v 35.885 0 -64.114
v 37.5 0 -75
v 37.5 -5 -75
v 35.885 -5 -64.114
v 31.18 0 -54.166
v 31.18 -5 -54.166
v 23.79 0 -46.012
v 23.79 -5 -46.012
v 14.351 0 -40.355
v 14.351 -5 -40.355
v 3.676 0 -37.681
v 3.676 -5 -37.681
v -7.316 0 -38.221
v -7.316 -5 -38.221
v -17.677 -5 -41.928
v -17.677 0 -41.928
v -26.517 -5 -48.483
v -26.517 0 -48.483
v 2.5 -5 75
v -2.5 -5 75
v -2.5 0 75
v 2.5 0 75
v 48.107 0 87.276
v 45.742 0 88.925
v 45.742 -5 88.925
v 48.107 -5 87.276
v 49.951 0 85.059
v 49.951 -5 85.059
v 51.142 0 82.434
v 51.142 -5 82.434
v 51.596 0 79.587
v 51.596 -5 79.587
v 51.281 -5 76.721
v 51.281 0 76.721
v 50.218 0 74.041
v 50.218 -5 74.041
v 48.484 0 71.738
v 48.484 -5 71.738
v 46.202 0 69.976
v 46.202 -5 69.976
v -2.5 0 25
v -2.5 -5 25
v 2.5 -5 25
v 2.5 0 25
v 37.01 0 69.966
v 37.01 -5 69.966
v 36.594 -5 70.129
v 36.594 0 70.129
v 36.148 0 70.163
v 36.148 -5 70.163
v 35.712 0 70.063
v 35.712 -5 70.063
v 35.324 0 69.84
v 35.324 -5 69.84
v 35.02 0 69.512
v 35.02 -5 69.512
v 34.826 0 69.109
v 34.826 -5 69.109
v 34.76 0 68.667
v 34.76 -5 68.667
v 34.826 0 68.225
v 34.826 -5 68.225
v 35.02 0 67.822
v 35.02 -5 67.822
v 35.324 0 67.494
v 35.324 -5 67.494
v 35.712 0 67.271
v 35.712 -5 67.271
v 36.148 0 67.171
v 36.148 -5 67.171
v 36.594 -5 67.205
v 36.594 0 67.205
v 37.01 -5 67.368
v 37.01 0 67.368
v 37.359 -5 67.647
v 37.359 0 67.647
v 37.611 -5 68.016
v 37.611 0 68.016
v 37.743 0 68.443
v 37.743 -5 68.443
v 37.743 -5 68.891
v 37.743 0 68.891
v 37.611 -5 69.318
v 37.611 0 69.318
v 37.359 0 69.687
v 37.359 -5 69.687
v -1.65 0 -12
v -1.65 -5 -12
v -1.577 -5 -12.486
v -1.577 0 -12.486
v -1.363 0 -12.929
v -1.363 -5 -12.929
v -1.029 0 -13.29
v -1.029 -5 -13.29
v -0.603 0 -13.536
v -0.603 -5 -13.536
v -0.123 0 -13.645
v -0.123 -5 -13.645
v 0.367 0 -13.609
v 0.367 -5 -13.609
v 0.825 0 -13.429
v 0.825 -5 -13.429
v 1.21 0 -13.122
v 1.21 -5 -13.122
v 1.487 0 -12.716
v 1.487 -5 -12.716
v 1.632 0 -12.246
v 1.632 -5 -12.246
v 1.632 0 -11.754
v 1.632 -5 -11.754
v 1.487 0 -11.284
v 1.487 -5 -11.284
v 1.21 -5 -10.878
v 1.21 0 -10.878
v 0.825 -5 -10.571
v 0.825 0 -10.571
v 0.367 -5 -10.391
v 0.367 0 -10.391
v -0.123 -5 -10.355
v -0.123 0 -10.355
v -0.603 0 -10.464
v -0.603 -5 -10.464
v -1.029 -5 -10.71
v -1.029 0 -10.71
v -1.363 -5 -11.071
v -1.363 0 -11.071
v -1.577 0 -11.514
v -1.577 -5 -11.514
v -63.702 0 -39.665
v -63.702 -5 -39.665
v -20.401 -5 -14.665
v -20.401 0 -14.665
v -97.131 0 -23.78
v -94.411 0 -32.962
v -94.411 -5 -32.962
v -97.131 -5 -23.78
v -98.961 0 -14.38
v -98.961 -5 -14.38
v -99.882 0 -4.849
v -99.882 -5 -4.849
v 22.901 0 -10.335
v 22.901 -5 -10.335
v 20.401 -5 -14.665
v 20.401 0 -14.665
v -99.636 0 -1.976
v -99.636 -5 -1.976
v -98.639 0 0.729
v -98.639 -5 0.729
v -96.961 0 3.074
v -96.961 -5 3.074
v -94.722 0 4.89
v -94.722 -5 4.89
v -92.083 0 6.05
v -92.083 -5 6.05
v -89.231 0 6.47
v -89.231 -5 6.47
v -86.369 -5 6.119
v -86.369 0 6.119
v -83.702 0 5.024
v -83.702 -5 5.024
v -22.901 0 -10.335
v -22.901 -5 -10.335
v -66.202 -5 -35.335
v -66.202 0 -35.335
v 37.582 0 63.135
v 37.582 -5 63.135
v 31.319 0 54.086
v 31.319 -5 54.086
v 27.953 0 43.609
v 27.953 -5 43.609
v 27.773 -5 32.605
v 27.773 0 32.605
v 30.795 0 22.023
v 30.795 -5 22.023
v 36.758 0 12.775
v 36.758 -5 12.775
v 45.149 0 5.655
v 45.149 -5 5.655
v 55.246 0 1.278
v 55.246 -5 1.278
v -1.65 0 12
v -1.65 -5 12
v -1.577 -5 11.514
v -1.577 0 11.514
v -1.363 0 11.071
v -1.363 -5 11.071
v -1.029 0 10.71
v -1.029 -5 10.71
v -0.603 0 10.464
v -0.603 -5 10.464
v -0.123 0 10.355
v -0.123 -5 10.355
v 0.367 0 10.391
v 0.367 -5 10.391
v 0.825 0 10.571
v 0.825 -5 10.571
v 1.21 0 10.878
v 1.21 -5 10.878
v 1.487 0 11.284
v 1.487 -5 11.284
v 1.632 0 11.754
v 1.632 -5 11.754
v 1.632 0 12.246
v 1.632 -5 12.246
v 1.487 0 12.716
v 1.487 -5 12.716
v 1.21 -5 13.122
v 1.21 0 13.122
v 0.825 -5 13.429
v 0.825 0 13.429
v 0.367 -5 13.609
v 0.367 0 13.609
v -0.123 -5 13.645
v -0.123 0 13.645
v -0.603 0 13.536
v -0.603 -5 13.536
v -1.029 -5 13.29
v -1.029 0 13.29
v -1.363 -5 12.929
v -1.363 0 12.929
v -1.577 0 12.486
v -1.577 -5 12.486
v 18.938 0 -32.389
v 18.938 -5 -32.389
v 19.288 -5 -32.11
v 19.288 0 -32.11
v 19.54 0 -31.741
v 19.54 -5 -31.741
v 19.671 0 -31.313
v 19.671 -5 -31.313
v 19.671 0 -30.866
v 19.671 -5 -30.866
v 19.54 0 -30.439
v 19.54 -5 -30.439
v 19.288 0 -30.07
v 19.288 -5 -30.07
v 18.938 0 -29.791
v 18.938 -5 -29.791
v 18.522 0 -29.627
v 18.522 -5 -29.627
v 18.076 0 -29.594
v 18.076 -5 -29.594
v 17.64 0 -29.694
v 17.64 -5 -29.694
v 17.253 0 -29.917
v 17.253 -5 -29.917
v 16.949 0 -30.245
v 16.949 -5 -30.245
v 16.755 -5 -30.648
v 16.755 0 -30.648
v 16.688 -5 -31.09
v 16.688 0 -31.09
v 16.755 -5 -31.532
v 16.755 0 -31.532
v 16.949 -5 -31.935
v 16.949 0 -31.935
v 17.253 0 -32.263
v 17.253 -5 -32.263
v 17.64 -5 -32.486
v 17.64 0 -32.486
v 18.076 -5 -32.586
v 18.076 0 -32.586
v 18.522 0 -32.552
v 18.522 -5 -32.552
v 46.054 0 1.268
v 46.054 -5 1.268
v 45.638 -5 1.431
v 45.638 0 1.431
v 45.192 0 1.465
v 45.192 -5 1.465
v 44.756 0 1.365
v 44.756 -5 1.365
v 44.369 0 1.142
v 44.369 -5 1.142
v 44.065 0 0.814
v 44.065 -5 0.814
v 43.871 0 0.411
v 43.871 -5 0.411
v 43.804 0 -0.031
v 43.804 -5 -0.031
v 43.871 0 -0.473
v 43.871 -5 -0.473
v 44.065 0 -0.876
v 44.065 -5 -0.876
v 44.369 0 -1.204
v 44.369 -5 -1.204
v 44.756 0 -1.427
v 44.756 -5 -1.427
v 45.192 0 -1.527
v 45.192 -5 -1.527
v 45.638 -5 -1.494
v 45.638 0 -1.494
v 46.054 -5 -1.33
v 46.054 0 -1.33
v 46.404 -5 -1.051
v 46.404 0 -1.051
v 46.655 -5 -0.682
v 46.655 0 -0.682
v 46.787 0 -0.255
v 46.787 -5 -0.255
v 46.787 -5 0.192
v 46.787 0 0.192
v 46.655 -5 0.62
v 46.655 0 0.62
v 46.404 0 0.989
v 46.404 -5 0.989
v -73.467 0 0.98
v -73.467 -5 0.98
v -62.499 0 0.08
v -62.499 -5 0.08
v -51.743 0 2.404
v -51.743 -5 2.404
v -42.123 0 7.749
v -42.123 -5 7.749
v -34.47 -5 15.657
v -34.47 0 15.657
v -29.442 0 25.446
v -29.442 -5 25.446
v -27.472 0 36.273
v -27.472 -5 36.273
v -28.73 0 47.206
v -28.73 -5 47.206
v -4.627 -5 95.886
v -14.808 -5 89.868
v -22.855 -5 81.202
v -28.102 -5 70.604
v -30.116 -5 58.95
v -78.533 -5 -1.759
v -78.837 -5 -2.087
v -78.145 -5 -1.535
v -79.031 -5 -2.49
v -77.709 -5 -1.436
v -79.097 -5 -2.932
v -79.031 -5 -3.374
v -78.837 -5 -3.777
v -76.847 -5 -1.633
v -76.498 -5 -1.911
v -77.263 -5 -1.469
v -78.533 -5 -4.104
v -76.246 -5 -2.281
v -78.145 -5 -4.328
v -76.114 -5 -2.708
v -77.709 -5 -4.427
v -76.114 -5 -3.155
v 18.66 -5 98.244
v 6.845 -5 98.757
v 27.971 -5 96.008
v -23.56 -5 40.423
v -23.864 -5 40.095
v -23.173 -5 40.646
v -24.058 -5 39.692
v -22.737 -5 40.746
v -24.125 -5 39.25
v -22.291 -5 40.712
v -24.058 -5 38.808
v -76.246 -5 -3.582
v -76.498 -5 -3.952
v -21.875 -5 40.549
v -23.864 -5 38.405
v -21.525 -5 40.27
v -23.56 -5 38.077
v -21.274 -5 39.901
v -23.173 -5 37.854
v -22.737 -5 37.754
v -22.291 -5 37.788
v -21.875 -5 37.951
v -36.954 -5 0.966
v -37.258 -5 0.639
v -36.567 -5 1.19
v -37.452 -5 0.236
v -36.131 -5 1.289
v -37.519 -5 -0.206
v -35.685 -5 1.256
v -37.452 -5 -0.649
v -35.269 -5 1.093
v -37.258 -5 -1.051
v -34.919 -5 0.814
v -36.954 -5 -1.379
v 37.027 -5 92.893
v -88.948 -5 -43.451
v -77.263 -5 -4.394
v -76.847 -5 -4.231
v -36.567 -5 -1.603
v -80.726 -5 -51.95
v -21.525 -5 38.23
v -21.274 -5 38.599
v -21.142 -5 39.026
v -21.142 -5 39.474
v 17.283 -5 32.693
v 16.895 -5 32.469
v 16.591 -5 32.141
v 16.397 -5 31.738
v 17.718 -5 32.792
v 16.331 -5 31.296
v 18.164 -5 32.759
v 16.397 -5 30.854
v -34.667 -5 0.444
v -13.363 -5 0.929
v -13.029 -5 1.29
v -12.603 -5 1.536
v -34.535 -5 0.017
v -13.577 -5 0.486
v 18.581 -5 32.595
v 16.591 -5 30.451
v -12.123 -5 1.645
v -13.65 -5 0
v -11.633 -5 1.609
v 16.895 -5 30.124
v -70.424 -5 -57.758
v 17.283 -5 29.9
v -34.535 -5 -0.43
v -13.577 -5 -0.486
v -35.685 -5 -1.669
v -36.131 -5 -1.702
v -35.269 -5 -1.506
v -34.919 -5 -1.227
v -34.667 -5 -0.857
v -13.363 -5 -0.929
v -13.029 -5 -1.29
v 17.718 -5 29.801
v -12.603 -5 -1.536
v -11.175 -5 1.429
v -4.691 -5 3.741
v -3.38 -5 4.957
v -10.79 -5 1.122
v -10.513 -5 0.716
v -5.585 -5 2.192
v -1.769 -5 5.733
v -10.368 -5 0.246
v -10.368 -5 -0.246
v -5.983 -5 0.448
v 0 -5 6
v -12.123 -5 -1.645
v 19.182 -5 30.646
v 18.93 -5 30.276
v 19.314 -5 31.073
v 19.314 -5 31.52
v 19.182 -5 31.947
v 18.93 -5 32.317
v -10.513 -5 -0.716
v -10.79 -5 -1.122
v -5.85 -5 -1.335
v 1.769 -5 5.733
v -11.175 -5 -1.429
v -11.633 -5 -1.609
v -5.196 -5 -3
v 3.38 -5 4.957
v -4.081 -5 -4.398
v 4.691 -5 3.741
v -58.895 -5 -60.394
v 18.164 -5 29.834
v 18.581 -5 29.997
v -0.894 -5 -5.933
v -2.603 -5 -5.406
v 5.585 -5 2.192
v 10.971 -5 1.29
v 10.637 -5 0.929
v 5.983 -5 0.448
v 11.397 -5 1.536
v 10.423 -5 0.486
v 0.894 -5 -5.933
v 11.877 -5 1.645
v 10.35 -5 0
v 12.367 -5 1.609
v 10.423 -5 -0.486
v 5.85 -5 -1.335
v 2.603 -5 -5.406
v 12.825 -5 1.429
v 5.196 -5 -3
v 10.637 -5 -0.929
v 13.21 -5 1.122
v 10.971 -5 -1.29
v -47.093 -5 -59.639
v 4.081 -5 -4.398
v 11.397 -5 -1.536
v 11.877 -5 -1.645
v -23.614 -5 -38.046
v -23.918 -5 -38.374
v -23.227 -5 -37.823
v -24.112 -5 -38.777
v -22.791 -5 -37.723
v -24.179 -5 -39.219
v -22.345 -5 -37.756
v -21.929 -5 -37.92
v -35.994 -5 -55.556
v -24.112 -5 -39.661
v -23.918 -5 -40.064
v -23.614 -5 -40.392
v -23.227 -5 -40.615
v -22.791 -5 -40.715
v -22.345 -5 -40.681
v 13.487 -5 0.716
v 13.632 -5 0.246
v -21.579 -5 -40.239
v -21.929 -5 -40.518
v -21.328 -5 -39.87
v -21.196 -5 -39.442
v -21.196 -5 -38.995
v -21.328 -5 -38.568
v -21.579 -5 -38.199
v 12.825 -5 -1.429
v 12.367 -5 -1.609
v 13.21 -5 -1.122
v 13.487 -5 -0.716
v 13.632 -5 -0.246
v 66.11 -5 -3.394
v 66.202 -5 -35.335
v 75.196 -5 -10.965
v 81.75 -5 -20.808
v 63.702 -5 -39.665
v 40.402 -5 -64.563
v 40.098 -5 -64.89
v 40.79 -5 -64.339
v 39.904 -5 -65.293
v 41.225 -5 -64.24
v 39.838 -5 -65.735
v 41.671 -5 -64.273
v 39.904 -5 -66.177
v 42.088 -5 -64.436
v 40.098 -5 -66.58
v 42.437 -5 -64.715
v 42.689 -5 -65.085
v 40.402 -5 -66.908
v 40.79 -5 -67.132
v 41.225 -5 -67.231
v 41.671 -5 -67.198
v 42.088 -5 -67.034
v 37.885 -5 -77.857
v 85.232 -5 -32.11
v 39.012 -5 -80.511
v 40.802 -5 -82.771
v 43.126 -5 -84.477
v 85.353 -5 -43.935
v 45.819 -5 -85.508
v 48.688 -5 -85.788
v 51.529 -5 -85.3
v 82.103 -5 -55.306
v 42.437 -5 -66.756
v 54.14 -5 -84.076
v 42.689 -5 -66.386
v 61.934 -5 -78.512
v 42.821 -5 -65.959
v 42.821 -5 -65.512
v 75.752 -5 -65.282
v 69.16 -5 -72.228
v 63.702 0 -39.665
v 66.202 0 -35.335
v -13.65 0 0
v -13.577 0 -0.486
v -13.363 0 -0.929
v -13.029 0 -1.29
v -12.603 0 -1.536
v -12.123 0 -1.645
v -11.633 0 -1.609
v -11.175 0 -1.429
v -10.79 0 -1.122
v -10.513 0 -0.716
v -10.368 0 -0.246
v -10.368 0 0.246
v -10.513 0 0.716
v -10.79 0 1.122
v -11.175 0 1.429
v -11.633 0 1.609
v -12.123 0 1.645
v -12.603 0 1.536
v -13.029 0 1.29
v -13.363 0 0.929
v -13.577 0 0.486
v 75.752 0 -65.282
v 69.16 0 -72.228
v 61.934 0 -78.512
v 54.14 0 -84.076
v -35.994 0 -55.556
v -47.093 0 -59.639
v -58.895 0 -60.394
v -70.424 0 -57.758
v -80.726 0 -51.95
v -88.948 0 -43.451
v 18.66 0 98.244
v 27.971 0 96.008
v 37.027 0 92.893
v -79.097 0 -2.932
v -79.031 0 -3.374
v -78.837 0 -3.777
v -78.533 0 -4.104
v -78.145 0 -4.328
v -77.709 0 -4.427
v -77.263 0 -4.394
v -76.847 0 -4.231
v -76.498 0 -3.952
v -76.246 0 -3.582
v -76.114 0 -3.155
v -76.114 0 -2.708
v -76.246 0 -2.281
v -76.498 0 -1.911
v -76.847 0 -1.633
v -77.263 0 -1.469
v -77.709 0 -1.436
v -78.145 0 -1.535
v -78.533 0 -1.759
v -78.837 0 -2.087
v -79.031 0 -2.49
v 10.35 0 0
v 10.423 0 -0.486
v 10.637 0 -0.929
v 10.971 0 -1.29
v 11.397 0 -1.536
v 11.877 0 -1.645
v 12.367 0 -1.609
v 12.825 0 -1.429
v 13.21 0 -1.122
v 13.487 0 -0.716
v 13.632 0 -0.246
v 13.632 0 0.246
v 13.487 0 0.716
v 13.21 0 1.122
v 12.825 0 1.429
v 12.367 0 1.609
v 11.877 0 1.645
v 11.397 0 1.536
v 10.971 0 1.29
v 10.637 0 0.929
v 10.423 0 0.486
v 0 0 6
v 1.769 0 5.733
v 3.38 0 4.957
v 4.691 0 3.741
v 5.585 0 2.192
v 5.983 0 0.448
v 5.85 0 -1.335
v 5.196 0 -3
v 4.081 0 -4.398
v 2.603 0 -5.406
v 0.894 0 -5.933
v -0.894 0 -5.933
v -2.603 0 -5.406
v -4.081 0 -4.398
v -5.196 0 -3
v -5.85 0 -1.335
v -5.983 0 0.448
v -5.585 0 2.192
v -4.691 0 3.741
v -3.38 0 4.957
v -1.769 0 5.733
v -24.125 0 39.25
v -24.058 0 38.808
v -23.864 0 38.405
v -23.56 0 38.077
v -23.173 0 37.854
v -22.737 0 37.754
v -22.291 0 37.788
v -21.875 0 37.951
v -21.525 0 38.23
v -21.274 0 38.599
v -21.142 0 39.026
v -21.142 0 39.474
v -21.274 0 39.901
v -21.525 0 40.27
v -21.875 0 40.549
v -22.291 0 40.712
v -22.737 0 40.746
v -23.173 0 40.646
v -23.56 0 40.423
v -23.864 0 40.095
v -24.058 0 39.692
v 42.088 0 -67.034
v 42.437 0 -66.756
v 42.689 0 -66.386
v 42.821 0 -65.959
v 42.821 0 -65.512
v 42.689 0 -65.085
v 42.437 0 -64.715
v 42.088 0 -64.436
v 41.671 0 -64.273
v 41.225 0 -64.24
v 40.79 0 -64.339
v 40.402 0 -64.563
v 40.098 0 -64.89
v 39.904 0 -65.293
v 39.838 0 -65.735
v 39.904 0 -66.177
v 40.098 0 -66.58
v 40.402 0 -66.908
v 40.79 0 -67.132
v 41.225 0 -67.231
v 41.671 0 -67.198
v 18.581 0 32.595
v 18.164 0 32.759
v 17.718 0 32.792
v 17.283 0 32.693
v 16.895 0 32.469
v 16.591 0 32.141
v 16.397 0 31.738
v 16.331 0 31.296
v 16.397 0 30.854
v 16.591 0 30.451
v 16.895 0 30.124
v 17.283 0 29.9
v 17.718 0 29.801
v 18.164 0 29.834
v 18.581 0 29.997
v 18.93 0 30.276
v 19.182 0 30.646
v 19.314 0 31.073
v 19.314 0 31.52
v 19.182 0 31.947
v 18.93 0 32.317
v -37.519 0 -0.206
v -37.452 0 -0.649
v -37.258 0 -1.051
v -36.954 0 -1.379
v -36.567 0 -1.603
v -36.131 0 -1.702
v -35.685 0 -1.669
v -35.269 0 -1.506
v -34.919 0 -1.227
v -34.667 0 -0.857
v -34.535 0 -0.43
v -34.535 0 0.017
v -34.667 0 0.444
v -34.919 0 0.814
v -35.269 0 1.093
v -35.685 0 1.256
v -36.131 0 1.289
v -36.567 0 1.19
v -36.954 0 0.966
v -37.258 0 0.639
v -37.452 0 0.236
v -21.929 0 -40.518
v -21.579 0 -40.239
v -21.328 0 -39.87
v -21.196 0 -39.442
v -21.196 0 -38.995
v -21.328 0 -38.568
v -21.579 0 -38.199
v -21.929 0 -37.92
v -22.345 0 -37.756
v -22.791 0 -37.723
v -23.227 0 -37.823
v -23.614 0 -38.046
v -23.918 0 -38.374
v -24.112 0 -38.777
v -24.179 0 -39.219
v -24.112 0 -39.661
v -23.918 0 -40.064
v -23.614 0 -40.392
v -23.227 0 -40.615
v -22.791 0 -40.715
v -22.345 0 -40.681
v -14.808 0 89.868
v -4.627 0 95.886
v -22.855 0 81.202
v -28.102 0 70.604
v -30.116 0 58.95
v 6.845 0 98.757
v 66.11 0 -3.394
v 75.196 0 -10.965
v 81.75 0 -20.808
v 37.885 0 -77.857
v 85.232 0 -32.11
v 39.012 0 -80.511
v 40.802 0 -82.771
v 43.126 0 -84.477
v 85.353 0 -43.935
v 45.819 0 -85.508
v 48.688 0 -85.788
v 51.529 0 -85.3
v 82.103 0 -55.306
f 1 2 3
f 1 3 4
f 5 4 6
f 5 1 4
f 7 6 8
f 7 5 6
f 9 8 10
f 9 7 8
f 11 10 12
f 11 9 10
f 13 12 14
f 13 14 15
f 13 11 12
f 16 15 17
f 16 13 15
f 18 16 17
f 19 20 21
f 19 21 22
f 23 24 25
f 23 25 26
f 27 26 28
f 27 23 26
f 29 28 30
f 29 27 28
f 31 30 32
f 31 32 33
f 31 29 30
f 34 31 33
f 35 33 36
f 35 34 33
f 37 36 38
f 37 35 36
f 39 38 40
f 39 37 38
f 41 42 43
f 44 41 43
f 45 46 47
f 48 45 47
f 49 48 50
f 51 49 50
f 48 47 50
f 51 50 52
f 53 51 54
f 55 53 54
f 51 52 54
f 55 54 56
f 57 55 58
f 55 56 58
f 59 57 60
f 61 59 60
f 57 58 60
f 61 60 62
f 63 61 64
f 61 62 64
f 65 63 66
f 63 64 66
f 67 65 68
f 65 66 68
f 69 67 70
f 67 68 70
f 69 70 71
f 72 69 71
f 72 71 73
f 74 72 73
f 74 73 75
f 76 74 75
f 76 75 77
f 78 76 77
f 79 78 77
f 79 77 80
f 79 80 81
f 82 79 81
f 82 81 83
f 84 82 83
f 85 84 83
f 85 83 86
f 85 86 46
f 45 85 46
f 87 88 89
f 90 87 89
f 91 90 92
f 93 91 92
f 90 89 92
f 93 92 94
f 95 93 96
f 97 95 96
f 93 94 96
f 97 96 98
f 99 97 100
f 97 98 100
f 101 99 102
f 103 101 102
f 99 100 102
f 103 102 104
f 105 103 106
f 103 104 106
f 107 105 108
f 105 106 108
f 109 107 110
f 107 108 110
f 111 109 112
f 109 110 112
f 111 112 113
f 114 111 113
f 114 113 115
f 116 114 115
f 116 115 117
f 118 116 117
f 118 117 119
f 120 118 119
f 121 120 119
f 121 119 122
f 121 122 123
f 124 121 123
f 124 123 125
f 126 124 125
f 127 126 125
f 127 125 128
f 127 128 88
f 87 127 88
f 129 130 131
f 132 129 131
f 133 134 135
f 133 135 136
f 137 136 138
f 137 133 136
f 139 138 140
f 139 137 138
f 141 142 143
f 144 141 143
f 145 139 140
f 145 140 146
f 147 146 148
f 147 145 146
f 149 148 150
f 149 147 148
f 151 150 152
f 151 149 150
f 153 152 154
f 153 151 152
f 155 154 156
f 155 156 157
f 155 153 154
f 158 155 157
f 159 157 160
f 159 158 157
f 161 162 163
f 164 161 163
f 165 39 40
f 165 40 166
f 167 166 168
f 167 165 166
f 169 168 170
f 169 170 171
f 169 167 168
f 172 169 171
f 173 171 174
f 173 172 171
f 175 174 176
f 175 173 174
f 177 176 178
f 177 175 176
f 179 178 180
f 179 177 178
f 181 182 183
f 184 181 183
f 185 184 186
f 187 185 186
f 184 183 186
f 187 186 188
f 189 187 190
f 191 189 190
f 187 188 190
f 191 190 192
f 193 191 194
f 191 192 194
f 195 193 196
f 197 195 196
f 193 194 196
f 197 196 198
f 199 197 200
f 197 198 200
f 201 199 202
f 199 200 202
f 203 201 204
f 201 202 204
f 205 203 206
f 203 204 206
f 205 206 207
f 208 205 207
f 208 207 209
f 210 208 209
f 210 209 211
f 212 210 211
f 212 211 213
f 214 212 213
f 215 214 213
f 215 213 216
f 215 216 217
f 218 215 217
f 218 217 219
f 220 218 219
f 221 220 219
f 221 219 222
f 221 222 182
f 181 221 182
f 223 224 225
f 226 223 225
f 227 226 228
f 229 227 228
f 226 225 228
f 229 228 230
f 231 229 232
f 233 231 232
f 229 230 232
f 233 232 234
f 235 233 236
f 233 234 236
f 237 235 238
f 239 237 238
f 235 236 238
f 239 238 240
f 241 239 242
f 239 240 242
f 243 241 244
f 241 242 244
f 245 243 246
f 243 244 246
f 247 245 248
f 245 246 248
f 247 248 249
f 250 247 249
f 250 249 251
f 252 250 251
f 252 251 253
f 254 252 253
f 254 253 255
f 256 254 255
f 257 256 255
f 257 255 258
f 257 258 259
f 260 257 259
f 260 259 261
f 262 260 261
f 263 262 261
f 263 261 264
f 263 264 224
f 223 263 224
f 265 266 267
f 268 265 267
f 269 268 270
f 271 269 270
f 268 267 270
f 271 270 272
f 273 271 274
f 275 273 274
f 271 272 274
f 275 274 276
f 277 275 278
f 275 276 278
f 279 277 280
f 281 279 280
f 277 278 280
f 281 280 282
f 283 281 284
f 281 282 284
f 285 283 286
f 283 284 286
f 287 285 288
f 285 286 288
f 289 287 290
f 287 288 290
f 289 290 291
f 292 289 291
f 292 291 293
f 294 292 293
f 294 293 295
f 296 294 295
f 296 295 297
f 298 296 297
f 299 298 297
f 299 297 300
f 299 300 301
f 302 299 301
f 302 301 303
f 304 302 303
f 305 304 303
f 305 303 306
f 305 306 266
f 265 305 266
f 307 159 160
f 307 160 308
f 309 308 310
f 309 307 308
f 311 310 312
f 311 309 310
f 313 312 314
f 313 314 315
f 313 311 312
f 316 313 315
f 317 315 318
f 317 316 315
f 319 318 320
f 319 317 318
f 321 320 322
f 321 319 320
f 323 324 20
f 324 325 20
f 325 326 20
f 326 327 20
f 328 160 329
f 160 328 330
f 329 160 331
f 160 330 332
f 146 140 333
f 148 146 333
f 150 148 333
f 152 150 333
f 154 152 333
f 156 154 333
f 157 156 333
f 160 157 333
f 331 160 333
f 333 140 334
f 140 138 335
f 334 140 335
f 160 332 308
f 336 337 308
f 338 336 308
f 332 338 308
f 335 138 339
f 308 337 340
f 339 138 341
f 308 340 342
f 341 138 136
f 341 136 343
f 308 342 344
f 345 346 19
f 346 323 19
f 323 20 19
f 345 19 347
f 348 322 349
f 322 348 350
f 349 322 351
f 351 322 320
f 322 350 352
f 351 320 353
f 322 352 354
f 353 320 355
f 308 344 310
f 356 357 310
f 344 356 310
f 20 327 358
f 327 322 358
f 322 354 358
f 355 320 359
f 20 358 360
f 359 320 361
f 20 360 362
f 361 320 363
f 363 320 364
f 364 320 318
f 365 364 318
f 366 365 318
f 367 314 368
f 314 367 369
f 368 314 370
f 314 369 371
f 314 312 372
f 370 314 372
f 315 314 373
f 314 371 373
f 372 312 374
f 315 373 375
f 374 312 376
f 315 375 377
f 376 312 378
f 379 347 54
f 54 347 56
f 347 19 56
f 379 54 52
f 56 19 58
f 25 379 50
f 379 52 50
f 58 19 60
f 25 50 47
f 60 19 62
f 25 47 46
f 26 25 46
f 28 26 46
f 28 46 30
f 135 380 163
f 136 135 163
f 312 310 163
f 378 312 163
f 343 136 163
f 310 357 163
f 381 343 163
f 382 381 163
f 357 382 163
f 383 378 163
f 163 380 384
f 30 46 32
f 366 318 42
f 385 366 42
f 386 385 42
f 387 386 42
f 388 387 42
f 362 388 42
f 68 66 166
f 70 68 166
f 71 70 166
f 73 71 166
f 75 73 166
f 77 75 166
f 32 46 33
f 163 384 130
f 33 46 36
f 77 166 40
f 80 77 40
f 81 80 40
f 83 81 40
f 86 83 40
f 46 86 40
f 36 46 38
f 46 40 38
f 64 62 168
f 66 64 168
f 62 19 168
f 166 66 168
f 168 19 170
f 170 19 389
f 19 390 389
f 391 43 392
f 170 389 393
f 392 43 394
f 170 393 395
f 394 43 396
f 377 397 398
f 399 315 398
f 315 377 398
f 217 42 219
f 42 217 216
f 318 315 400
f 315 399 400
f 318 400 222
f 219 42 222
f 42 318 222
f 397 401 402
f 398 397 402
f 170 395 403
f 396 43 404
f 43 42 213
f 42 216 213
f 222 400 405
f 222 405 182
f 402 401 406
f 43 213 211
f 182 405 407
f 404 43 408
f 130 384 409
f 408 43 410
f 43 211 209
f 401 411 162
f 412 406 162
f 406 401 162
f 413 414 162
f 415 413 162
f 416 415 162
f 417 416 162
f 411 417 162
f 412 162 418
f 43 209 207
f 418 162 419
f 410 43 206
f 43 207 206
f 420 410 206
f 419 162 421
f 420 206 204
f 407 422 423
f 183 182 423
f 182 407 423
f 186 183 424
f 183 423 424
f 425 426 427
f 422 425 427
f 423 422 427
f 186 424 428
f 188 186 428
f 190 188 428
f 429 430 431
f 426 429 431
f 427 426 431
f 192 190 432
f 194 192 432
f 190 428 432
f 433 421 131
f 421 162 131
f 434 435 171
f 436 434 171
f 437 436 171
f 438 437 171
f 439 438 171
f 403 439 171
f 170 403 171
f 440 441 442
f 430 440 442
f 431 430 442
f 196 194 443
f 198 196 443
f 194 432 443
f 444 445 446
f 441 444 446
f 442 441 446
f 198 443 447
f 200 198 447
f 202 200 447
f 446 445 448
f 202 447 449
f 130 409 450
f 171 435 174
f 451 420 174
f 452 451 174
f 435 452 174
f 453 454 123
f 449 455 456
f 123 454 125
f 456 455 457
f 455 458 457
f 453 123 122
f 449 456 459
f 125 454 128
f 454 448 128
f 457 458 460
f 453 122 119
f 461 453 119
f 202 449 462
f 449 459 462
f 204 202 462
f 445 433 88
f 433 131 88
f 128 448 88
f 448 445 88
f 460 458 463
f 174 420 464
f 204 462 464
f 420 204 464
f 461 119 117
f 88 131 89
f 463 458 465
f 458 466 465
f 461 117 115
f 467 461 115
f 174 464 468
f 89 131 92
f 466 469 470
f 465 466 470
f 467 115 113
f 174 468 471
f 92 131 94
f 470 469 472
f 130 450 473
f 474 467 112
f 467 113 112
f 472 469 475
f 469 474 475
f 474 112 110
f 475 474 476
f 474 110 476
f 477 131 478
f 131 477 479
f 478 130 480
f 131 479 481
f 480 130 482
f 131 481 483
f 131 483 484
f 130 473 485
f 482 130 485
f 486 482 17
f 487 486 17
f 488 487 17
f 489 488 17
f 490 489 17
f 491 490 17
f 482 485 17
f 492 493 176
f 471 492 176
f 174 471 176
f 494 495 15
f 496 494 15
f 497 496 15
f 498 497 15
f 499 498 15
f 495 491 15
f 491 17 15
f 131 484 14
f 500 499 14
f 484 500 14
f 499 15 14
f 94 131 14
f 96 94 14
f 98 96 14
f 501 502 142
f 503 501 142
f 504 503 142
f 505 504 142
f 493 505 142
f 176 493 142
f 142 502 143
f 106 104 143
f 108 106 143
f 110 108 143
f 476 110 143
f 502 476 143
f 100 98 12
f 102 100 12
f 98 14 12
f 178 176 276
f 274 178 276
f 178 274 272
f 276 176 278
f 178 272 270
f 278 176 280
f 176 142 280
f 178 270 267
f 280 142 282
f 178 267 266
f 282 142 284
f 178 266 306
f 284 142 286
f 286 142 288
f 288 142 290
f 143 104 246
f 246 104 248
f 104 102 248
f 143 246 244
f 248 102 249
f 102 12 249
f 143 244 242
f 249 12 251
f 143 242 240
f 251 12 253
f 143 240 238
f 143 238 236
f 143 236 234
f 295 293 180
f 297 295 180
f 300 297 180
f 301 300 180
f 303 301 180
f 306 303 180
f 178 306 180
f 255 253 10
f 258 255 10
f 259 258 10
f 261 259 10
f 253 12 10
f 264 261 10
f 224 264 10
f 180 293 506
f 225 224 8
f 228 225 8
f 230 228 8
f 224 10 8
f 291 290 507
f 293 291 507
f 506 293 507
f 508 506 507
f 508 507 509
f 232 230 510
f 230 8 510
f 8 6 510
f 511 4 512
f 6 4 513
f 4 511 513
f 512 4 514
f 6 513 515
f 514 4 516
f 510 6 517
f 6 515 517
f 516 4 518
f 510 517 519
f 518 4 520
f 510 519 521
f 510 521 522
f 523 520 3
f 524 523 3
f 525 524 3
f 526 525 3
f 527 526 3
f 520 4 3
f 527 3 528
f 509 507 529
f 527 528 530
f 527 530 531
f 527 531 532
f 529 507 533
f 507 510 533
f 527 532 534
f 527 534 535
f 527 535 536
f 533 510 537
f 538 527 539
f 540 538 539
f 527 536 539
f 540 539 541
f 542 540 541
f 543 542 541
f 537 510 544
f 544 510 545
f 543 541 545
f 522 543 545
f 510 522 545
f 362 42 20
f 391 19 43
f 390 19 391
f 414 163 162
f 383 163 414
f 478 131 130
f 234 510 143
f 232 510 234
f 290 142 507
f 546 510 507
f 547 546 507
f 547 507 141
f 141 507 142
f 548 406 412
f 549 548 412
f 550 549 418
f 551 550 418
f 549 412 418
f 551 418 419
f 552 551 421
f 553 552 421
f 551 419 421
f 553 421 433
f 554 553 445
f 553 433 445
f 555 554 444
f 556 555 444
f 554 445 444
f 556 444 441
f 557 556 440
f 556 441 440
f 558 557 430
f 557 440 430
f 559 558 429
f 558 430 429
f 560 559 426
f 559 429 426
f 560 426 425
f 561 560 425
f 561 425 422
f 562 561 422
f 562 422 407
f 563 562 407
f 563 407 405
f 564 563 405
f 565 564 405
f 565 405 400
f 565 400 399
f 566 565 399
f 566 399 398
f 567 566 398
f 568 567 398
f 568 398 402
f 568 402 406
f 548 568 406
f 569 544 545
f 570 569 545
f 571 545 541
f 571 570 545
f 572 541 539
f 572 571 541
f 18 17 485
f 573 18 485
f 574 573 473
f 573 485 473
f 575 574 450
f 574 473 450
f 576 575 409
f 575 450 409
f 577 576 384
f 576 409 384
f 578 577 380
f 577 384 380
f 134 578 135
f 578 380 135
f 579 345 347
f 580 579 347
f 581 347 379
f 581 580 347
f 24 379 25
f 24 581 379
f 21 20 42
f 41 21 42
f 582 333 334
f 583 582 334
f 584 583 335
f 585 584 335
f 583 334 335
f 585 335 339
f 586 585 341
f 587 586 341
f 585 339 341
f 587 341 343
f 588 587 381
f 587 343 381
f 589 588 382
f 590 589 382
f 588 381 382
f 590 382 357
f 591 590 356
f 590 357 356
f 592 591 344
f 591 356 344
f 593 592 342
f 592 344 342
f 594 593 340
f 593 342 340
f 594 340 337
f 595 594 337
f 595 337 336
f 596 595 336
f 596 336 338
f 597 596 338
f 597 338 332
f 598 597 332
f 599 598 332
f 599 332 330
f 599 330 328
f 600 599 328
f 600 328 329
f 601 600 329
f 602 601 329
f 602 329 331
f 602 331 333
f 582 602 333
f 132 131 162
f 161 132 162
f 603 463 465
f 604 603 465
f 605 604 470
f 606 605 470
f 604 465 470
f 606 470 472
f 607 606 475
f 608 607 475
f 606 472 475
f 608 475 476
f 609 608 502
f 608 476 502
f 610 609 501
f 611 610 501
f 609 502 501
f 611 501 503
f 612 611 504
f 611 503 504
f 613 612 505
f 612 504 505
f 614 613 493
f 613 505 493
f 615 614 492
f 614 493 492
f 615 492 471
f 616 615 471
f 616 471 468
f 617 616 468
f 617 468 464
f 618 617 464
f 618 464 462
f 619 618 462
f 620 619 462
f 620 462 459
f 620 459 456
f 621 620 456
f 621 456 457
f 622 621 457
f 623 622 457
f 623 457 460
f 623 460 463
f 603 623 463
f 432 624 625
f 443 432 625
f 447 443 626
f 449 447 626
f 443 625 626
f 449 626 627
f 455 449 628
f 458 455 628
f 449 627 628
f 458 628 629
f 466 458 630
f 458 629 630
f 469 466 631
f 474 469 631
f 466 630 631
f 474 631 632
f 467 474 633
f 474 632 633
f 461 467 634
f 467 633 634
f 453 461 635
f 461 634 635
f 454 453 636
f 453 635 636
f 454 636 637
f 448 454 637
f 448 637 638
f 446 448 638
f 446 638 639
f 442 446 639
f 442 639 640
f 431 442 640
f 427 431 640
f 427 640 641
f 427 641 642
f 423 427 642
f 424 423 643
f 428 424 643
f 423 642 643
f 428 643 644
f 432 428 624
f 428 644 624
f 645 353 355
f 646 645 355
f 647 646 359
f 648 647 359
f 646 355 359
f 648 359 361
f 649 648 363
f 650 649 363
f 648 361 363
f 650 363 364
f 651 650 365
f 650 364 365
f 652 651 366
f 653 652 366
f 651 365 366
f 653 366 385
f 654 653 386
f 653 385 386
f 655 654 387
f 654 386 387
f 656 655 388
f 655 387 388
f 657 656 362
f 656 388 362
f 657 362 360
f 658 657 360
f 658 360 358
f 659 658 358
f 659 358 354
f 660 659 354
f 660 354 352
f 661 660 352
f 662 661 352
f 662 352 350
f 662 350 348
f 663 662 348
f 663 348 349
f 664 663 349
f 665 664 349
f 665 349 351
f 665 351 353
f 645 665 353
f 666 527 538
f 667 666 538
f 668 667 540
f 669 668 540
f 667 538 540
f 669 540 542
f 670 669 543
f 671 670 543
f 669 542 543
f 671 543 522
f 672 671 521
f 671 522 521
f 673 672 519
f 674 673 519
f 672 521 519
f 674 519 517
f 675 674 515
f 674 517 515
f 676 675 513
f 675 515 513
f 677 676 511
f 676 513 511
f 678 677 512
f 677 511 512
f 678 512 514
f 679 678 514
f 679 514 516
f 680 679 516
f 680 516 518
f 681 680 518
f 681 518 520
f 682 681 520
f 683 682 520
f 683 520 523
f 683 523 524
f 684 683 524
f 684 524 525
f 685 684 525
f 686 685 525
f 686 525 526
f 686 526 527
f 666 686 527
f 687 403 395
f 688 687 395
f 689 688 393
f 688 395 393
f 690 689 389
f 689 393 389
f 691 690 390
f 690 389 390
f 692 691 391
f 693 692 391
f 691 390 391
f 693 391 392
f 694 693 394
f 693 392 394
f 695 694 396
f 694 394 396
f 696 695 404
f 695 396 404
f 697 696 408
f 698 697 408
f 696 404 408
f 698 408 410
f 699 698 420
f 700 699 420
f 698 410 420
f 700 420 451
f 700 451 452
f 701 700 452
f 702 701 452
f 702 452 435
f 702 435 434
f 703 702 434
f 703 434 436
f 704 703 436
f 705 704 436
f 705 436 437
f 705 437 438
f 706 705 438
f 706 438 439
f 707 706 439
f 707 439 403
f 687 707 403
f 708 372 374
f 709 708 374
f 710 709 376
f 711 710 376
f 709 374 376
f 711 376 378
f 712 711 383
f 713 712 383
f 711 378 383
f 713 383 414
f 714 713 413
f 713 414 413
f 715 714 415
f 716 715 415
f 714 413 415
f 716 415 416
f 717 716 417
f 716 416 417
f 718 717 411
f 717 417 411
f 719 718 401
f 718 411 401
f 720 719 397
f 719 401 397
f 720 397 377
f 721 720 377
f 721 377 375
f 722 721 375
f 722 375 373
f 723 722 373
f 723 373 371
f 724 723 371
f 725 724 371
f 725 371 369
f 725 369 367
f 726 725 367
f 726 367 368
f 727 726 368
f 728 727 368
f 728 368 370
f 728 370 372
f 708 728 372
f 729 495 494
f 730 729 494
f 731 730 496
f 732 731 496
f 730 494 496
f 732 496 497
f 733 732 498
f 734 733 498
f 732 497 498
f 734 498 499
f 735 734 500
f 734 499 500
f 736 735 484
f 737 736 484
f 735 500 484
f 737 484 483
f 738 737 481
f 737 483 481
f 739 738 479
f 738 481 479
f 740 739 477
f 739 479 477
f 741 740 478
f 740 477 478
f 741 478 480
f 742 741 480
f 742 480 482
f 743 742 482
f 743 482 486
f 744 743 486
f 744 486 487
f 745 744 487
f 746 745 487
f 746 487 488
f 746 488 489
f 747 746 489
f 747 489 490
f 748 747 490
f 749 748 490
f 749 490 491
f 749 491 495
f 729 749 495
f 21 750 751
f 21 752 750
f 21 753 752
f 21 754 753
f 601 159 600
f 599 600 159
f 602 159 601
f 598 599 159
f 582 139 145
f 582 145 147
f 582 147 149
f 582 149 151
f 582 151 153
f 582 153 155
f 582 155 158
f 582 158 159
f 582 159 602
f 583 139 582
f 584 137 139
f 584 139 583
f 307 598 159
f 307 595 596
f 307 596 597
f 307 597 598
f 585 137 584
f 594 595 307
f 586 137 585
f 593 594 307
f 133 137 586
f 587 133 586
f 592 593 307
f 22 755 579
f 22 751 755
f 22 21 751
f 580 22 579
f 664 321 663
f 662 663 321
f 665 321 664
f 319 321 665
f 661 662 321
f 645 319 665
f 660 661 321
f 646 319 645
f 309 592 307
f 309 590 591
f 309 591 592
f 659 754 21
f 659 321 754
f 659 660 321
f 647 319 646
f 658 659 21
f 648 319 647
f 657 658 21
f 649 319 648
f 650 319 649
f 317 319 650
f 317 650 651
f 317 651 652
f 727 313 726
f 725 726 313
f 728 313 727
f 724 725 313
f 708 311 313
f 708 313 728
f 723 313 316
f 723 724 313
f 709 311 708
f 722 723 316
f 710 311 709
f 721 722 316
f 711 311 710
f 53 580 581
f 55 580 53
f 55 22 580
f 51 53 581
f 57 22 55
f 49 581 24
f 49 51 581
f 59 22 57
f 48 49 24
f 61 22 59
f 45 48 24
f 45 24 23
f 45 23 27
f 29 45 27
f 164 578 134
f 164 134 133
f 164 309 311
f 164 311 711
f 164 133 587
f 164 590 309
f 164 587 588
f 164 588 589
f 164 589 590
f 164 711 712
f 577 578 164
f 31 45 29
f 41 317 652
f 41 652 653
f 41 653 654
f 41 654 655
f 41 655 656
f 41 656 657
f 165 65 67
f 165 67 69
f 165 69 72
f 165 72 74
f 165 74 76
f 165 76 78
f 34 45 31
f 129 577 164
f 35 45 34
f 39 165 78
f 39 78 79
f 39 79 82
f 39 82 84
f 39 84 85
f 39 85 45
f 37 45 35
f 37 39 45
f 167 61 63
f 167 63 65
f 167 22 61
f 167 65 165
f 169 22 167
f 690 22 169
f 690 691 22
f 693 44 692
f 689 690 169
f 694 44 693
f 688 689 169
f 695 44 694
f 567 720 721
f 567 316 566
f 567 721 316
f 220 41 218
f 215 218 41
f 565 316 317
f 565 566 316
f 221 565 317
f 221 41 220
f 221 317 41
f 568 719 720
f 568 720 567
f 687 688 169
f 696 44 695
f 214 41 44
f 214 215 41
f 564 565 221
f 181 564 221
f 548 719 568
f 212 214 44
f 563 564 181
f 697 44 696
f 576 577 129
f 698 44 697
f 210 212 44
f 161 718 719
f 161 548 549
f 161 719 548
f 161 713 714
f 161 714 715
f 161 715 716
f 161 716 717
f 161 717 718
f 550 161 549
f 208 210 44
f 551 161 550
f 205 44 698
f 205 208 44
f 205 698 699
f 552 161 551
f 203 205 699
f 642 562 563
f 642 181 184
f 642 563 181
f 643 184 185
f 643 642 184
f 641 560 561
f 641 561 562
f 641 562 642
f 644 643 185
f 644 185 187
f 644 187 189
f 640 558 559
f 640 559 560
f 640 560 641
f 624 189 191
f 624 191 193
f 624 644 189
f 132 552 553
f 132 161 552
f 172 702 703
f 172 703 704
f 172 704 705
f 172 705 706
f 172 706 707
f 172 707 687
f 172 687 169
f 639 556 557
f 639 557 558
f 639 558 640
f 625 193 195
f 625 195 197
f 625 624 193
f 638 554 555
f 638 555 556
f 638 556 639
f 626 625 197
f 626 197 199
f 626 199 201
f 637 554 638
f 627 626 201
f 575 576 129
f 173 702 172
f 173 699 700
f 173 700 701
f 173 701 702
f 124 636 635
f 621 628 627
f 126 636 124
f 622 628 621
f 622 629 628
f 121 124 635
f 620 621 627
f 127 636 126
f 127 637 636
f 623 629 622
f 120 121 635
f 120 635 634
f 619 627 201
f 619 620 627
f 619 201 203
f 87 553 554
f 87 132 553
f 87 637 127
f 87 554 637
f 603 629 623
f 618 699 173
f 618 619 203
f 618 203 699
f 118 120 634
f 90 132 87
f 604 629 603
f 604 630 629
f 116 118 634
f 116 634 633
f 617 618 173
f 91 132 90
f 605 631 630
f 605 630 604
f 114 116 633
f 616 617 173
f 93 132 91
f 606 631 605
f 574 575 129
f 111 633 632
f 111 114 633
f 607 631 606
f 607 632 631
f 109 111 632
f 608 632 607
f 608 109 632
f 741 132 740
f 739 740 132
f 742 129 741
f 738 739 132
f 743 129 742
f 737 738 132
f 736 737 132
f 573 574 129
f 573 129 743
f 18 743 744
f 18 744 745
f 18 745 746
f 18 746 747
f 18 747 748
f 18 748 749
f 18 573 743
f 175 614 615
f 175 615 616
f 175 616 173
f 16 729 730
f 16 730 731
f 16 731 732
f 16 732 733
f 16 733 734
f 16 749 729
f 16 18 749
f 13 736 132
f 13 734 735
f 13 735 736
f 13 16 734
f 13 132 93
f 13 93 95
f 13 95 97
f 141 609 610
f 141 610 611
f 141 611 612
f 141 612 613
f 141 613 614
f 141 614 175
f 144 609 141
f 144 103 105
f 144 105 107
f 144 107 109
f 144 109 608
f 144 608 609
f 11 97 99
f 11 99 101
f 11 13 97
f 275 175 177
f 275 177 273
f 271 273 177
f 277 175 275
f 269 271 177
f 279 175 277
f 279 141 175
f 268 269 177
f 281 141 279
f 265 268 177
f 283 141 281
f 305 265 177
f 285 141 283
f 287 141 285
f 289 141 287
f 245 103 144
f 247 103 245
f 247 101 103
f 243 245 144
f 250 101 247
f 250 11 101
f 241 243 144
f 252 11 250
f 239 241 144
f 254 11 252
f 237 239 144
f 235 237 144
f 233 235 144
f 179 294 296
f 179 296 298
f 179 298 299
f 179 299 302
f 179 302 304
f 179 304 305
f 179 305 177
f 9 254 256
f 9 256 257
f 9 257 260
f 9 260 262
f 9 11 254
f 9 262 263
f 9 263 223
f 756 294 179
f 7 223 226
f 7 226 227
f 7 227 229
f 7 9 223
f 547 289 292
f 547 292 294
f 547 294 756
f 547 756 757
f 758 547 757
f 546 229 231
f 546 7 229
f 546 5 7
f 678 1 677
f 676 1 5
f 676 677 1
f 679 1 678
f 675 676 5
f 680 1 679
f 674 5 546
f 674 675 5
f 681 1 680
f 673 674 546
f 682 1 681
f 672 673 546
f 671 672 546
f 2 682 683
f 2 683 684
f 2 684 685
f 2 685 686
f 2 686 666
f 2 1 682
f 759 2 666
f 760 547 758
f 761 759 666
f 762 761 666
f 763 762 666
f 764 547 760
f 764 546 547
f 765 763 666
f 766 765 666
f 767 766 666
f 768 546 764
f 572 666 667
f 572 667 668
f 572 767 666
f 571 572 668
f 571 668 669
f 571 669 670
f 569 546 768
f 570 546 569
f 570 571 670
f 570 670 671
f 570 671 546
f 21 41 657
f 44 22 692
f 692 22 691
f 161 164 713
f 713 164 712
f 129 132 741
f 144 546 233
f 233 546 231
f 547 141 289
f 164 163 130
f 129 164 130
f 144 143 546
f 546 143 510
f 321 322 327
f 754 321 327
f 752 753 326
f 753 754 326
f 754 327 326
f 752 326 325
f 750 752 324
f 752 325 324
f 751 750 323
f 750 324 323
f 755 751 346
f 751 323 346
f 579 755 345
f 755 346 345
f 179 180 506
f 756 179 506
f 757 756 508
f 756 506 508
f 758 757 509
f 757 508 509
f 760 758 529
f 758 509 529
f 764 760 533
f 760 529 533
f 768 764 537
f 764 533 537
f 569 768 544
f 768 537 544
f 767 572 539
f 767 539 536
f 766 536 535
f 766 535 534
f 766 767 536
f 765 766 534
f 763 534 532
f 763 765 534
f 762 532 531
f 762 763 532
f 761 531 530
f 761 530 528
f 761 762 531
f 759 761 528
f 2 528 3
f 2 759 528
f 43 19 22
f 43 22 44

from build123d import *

# Parameters (mm, degrees)
SKETCH_1_R               = 6
EXTRUDE_1_DEPTH          = 5
CUT_EXTRUDE_1_DEPTH      = 142.435598161
CUT_EXTRUDE_1_DEPTH_BACK = 142.435598161
SKETCH_5_W               = 5
SKETCH_5_H               = 50
F_3_0MM_1_D              = 3
PATTERN_CIRCULAR_1_COUNT = 3
HOLE_WIZARD_M4_1_D       = 3.3


with BuildPart() as part:
    # 草圖1 → 填料-伸長1 (new body)
    with BuildSketch(Plane(origin=(0, 0, 0), x_dir=(1, 0, 0), z_dir=(0, 1, 0))):
        with BuildLine():
            ThreePointArc((-54.140127389, 84.076433121), (-86.602540378, 50), (-99.882390637, 4.848509122))
            ThreePointArc((-99.882390637, 4.848509122), (-94.722486108, -4.890404948), (-83.701905284, -5.024047358))
            ThreePointArc((-83.701905284, -5.024047358), (-32.475952642, -18.75), (-46.201905284, -69.975952642))
            ThreePointArc((-46.201905284, -69.975952642), (-51.596457973, -79.586876805), (-45.742263248, -88.924942243))
            ThreePointArc((-45.742263248, -88.924942243), (0, -100), (45.742263248, -88.924942243))
            ThreePointArc((45.742263248, -88.924942243), (51.596457973, -79.586876805), (46.201905284, -69.975952642))
            ThreePointArc((46.201905284, -69.975952642), (32.475952642, -18.75), (83.701905284, -5.024047358))
            ThreePointArc((83.701905284, -5.024047358), (94.722486108, -4.890404948), (99.882390637, 4.848509122))
            ThreePointArc((99.882390637, 4.848509122), (86.602540378, 50), (54.140127389, 84.076433121))
            ThreePointArc((54.140127389, 84.076433121), (43.126028135, 84.477281753), (37.5, 75))
            ThreePointArc((37.5, 75), (0, 37.5), (-37.5, 75))
            ThreePointArc((-37.5, 75), (-43.126028135, 84.477281753), (-54.140127389, 84.076433121))
        make_face()
        with Locations(Location((0, 0, 0), (0, 0, 270))):
            Circle(SKETCH_1_R, mode=Mode.SUBTRACT)
    extrude(amount=-EXTRUDE_1_DEPTH)

    # 草圖5 → 除料-伸長1 (cut, two sides: drawn at the far end of the back side and taken through both)
    with BuildSketch(Plane(origin=(0, 0, 0), x_dir=(1, 0, 0), z_dir=(0, 1, 0)).offset(-CUT_EXTRUDE_1_DEPTH_BACK)):
        with BuildLine():
            ThreePointArc((18.659757868, -98.243643236), (-14.320442433, -98.969313065), (-45.742263248, -88.924942243))
            ThreePointArc((-45.742263248, -88.924942243), (-51.596457973, -79.586876805), (-46.201905284, -69.975952642))
            ThreePointArc((-46.201905284, -69.975952642), (-35.201155023, -60.328553588), (-28.729686798, -47.205714191))
            ThreePointArc((-28.729686798, -47.205714191), (-19.144613028, -85.825688538), (18.659757868, -98.243643236))
        make_face()
        with BuildLine():
            ThreePointArc((75.751611869, 65.28164596), (92.870160526, 37.082789592), (99.882390637, 4.848509122))
            ThreePointArc((99.882390637, 4.848509122), (94.722486108, -4.890404948), (83.701905284, -5.024047358))
            ThreePointArc((83.701905284, -5.024047358), (69.846637492, -0.320817698), (55.246191092, -1.277781514))
            ThreePointArc((55.246191092, -1.277781514), (83.899533086, 26.333123041), (75.751611869, 65.28164596))
        make_face()
        Polygon((-20.400635095, 14.665063509), (-22.900635095, 10.334936491), (-66.201905284, 35.334936491), (-63.701905284, 39.665063509), align=None)
        with Locations((0, -50)):
            Rectangle(SKETCH_5_W, SKETCH_5_H)
        Polygon((22.900635095, 10.334936491), (20.400635095, 14.665063509), (63.701905284, 39.665063509), (66.201905284, 35.334936491), align=None)
        with BuildLine():
            ThreePointArc((-37.5, 75), (-34.645482469, 60.649371286), (-26.516504294, 48.483495706))
            ThreePointArc((-26.516504294, 48.483495706), (-64.754920057, 59.492565497), (-94.411369737, 32.961997276))
            ThreePointArc((-94.411369737, 32.961997276), (-78.549718093, 61.886523473), (-54.140127389, 84.076433121))
            ThreePointArc((-54.140127389, 84.076433121), (-43.126028135, 84.477281753), (-37.5, 75))
        make_face()
    extrude(amount=CUT_EXTRUDE_1_DEPTH + CUT_EXTRUDE_1_DEPTH_BACK, mode=Mode.SUBTRACT)

    # Ø3.0mm 定位孔1 (through all)
    with Locations(Plane(origin=(0, 0, 0), x_dir=(1, 0, 0), z_dir=(0, 1, 0))):
        with Locations((-36.018712394, 0.206471091), (-22.625047496, -39.249993361), (-77.597265982, 2.931673472)):
            f_3_0mm_1 = Hole(F_3_0MM_1_D / 2)

    # 環狀複製排列1: Ø3.0mm 定位孔1 ×3 about axis
    pattern_circular_1_axis = Axis((0, 0, 0), (0, 1, 0))
    for i in range(1, PATTERN_CIRCULAR_1_COUNT):
        add(f_3_0mm_1.rotate(pattern_circular_1_axis, i * 360 / PATTERN_CIRCULAR_1_COUNT), mode=Mode.SUBTRACT)

    # M4 螺紋孔1 (through all)
    with Locations(Plane(origin=(0, 0, 0), x_dir=(1, 0, 0), z_dir=(0, 1, 0))):
        with Locations((0, 12), (12, 0), (0, -12), (-12, 0)):
            Hole(HOLE_WIZARD_M4_1_D / 2)


solid = part.part
